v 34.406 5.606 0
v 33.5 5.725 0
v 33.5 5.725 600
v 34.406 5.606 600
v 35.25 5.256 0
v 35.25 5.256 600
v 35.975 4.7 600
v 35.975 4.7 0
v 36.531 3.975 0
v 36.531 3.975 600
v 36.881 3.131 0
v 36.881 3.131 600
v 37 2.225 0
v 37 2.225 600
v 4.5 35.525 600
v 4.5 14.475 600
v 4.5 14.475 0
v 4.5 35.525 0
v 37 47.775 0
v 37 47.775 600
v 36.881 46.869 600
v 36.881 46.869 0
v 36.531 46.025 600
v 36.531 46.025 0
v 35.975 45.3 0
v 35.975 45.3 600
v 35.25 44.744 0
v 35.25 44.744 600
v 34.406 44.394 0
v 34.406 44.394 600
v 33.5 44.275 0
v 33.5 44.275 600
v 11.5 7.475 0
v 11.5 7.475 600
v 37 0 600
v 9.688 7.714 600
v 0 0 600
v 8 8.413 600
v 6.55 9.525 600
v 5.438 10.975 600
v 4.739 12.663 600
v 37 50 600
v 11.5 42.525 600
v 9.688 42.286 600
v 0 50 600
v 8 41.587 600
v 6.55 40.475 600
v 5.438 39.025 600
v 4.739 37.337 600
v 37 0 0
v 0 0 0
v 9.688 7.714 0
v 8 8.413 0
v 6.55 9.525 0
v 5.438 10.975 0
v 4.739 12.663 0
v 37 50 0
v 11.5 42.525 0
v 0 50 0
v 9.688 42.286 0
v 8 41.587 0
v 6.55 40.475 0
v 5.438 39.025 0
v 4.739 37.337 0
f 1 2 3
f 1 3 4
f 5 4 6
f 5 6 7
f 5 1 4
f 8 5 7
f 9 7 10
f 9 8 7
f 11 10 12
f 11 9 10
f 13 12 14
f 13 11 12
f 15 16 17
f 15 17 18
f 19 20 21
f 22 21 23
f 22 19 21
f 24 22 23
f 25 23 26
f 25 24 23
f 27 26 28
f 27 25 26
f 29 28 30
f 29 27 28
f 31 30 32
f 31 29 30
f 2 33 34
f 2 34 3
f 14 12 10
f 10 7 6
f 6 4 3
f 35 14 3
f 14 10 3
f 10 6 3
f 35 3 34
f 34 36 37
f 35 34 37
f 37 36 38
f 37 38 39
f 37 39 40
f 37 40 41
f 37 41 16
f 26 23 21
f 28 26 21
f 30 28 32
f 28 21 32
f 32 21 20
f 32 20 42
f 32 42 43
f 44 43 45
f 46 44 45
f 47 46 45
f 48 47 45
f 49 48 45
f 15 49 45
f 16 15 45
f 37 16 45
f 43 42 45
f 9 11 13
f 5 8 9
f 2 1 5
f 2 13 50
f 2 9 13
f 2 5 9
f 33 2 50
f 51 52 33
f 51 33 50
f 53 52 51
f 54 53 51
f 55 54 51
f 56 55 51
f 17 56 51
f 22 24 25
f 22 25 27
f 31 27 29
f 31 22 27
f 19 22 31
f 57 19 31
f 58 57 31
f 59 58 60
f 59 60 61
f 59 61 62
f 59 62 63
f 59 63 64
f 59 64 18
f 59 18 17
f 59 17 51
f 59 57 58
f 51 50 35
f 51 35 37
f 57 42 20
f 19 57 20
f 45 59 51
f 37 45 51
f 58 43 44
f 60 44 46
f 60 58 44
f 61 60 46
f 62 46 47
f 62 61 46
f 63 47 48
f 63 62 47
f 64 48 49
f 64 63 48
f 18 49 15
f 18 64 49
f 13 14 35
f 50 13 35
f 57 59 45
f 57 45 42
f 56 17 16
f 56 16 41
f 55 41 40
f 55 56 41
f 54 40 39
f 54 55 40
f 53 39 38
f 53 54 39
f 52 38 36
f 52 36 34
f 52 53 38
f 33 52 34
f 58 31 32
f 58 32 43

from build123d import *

# Parameters (mm, degrees)
EXTRUDE_1_DEPTH = 600


with BuildPart() as part:
    # 草图1 → 拉伸1 (new body)
    with BuildSketch(Plane.XY):
        with BuildLine():
            Line((4.5, 35.525), (4.5, 14.475))
            ThreePointArc((4.5, 14.475), (6.550252532, 9.525252532), (11.5, 7.475))
            Line((11.5, 7.475), (33.5, 5.725))
            ThreePointArc((33.5, 5.725), (35.974873734, 4.699873734), (37, 2.225))
            Line((37, 2.225), (37, 0))
            Line((37, 0), (0, 0))
            Line((0, 0), (0, 50))
            Line((0, 50), (37, 50))
            Line((37, 50), (37, 47.775))
            ThreePointArc((37, 47.775), (35.974873734, 45.300126266), (33.5, 44.275))
            Line((33.5, 44.275), (11.5, 42.525))
            ThreePointArc((11.5, 42.525), (6.550252532, 40.474747468), (4.5, 35.525))
        make_face()
        with BuildLine():
            Line((0, 50), (0, 25))
            Line((0, 25), (4.5, 25))
            Line((4.5, 25), (4.5, 35.525))
            ThreePointArc((4.5, 35.525), (6.550252532, 40.474747468), (11.5, 42.525))
            Line((11.5, 42.525), (33.5, 44.275))
            ThreePointArc((33.5, 44.275), (35.974873734, 45.300126266), (37, 47.775))
            Line((37, 47.775), (37, 50))
            Line((37, 50), (0, 50))
        make_face()
    extrude(amount=EXTRUDE_1_DEPTH)


solid = part.part
